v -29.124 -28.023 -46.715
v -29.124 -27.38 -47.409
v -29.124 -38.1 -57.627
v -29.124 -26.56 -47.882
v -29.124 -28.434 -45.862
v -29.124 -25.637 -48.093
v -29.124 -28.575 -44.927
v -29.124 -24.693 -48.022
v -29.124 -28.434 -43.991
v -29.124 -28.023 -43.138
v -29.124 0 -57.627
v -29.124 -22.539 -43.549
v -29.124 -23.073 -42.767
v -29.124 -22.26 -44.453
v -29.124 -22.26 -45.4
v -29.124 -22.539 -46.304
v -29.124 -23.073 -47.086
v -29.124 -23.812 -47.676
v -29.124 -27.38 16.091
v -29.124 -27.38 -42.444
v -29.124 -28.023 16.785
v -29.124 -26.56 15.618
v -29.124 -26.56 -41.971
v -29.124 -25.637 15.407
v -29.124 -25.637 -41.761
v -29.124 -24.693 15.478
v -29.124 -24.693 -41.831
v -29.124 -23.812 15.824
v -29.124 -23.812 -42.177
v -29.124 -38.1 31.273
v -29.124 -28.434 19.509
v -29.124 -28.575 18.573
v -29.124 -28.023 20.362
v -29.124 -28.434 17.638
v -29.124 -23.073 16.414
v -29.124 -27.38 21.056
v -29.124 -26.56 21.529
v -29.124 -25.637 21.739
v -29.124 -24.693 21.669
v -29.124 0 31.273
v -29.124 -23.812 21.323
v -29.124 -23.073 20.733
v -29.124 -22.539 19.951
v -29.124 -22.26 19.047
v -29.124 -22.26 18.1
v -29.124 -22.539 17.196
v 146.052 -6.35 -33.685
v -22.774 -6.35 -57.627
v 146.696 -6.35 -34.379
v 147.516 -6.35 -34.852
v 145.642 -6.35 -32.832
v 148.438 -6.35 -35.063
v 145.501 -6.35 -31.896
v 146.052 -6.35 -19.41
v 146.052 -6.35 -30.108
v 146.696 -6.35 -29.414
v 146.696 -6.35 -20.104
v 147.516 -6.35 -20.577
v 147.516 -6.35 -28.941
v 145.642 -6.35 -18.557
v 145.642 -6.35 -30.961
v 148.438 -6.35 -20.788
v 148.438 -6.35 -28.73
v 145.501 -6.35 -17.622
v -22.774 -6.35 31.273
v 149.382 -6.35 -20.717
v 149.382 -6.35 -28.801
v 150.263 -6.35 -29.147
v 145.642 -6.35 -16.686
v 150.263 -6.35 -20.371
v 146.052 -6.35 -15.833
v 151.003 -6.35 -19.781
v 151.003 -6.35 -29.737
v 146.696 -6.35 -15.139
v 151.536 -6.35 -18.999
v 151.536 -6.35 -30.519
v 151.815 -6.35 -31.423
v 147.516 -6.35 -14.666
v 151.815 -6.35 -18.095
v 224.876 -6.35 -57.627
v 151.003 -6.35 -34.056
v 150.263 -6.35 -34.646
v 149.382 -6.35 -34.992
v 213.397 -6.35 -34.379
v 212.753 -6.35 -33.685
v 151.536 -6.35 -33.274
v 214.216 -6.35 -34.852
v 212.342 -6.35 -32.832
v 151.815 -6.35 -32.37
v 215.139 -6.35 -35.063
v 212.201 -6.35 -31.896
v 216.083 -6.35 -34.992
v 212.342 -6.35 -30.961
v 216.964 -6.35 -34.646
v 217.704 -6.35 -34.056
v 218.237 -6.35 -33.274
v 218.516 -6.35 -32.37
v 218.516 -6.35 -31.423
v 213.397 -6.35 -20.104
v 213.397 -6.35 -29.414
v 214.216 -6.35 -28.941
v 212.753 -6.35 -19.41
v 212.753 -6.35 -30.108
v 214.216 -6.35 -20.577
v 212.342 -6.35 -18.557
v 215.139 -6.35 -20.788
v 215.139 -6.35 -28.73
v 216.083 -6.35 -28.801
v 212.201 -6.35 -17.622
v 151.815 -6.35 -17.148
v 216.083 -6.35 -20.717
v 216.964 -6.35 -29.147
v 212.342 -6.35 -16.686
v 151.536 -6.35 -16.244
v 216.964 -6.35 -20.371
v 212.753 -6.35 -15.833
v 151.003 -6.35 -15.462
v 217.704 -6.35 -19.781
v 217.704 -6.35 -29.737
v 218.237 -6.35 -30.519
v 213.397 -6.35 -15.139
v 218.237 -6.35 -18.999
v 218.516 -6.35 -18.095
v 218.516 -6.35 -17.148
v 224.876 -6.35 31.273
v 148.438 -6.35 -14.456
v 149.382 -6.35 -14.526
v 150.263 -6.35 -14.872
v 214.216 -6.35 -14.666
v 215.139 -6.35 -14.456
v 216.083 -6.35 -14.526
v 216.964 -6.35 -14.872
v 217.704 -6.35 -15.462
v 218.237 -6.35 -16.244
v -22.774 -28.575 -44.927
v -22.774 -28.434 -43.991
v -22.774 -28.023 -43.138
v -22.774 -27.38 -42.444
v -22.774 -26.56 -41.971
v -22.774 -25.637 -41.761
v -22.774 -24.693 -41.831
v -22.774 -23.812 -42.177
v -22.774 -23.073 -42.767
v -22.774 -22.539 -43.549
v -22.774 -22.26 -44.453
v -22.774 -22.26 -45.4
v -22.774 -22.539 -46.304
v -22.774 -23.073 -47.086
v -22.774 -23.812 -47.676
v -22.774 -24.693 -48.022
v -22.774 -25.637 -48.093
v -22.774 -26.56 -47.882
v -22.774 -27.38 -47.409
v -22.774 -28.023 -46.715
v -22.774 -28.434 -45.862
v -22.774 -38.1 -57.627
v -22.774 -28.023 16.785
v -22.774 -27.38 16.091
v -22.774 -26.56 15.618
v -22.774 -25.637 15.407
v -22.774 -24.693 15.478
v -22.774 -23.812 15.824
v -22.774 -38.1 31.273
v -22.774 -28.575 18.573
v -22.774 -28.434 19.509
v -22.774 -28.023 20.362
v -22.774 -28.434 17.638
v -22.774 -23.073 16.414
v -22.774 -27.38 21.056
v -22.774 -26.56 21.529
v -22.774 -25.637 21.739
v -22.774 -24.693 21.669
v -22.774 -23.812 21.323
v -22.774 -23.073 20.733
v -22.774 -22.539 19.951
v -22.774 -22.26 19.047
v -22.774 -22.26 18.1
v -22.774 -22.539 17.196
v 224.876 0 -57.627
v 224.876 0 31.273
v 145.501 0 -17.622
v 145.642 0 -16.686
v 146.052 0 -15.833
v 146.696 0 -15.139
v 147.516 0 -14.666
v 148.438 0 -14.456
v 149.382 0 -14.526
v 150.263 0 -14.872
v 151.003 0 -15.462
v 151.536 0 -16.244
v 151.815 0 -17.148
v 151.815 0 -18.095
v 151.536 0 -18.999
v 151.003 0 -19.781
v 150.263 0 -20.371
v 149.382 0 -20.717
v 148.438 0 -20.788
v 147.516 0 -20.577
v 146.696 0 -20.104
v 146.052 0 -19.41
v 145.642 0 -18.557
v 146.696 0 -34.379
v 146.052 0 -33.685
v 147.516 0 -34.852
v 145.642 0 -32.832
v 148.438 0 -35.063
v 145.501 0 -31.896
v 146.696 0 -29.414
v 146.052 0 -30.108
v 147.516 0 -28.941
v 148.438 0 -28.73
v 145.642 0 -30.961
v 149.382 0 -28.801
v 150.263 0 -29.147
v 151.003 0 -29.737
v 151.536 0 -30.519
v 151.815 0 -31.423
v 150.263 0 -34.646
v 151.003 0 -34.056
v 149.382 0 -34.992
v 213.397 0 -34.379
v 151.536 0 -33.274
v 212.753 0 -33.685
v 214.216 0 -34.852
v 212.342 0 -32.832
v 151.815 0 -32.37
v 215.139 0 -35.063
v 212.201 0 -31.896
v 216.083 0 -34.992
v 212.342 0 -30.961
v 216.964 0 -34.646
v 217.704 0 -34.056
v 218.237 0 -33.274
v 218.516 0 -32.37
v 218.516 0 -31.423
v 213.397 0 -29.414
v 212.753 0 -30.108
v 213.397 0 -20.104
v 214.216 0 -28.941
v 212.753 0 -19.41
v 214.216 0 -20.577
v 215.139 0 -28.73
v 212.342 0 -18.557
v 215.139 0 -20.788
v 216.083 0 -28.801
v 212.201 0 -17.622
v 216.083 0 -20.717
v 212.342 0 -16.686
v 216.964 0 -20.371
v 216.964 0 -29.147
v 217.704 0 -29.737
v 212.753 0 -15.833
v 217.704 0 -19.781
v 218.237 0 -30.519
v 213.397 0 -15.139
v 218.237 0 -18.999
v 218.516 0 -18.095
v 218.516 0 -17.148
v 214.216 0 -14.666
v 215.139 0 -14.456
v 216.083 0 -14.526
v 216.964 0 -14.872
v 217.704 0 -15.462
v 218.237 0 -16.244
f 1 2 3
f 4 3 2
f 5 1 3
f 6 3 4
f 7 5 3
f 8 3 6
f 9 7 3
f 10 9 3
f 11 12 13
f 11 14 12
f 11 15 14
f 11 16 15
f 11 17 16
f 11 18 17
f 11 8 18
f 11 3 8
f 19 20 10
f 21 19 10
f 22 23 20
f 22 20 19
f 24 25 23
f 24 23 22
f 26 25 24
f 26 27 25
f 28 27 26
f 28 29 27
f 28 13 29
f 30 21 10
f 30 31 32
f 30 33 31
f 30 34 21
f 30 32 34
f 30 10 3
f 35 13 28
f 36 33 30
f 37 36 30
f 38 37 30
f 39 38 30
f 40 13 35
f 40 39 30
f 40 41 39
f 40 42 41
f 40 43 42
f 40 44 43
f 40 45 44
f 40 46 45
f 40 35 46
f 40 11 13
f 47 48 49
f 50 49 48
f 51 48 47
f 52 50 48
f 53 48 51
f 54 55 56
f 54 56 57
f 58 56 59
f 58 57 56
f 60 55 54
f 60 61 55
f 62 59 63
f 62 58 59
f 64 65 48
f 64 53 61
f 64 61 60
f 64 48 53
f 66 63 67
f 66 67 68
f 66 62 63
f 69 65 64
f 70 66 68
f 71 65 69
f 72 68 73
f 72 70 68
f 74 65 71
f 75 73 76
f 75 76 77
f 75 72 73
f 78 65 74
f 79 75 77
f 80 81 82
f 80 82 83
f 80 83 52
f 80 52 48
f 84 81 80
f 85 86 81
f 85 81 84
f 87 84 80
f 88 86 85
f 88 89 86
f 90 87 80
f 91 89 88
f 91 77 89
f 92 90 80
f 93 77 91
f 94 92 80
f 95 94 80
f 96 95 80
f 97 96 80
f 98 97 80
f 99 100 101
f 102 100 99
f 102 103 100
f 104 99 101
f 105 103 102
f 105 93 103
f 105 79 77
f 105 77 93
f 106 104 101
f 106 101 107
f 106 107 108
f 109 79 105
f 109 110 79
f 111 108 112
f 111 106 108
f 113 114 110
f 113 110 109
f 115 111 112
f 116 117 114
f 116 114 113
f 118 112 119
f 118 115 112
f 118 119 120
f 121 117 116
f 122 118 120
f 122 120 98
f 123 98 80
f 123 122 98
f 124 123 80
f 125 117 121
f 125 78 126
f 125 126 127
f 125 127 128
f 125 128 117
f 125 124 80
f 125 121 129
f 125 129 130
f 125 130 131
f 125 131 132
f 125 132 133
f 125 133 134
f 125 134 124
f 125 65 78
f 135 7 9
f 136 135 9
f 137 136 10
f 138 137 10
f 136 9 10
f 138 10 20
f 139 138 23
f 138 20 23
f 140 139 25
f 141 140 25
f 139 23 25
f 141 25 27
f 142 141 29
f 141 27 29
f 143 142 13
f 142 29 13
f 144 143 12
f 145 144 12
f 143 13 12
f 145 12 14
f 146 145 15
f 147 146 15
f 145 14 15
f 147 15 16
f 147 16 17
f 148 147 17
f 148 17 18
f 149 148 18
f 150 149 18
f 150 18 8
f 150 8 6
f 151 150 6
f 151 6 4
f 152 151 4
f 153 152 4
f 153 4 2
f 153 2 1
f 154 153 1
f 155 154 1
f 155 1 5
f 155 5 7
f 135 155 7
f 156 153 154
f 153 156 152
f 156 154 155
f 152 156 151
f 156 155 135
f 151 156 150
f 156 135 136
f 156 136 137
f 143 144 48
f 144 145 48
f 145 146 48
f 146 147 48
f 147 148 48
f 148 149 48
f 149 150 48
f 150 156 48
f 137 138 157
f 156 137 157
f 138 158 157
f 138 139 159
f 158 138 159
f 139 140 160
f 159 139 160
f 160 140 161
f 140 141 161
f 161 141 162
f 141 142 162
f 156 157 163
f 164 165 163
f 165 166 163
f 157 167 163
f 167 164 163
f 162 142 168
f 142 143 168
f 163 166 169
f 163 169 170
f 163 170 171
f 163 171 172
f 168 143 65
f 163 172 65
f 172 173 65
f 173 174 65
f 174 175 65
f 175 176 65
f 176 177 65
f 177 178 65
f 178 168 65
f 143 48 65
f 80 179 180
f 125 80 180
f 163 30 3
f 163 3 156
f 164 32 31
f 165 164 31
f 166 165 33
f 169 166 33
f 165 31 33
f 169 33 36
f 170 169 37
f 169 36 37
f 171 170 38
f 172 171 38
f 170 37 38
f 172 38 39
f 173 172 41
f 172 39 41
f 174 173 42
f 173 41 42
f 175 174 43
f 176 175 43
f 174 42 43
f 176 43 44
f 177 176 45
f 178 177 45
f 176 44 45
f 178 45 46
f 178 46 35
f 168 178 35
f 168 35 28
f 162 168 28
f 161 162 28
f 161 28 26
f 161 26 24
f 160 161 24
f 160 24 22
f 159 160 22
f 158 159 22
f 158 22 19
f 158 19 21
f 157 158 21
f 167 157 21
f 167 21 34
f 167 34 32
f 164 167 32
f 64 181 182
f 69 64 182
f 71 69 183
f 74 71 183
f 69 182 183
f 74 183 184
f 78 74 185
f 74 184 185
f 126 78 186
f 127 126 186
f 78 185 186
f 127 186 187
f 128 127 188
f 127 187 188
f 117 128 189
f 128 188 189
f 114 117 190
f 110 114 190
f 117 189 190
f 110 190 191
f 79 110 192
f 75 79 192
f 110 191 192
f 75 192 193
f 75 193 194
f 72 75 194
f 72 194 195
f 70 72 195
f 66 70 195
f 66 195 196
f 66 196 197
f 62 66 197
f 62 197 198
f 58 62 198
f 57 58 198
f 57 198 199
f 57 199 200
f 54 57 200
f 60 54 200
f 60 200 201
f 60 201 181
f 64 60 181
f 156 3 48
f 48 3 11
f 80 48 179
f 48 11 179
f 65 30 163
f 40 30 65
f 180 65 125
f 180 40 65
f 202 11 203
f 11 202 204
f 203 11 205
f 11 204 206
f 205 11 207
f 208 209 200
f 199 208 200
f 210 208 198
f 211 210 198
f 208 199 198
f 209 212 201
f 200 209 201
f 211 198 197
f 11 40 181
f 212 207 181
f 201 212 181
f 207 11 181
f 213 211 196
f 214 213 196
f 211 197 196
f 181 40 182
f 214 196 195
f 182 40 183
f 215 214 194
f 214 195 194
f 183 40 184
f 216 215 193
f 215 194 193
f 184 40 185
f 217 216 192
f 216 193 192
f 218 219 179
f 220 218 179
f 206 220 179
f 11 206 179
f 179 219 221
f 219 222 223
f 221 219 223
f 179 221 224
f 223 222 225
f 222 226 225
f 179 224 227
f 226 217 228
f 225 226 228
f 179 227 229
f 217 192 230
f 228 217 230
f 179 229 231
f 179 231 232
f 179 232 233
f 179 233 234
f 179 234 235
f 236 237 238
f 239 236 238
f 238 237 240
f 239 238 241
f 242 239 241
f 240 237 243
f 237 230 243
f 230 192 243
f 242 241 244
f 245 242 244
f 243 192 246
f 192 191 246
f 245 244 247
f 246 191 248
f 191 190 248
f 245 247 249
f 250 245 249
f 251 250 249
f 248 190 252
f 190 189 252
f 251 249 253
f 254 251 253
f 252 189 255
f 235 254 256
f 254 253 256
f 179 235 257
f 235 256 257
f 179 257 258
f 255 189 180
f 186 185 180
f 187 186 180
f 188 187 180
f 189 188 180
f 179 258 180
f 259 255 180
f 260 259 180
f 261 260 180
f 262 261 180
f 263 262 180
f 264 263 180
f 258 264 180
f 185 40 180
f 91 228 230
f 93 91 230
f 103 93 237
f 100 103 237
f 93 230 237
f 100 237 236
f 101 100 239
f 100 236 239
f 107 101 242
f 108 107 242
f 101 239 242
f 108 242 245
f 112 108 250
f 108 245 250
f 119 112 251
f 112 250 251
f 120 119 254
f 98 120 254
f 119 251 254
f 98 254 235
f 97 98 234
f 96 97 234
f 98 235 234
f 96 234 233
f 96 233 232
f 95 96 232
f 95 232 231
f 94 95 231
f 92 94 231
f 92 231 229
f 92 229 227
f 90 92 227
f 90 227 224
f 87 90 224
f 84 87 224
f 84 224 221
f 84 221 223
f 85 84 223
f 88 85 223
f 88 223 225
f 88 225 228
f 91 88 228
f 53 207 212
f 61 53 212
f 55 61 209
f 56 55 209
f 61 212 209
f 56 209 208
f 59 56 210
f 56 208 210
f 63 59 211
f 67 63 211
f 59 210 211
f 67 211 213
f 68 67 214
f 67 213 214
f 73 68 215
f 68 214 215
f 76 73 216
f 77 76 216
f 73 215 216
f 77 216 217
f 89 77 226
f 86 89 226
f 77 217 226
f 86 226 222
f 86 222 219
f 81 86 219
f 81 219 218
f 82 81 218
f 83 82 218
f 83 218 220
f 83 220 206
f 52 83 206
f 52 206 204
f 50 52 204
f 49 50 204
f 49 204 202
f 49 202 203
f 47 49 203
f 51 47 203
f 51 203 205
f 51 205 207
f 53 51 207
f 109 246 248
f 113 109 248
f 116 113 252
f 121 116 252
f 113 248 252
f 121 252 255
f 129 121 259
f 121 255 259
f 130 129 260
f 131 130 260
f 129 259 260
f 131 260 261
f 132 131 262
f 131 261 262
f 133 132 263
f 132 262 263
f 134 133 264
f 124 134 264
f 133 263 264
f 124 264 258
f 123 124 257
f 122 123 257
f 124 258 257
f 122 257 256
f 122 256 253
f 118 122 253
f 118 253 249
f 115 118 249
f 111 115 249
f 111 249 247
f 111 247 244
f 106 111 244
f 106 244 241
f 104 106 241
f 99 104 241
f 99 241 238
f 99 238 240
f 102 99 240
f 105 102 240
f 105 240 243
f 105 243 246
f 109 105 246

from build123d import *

# Parameters (mm, degrees)
F0_W     = 254
F0_H     = 88.9
F1_DEPTH = 6.35
F3_D     = 6.35
F4_W     = 6.35
F4_H     = 88.9
F5_DEPTH = 31.75
F7_D     = 6.35


with BuildPart() as f1:
    # F0 (on Front) → F1 (new body)
    with BuildSketch(Plane.XZ):
        with Locations((97.875736, -13.176627)):
            Rectangle(F0_W, F0_H)
    extrude(amount=F1_DEPTH)

    # F3 (through all)
    with Locations(Plane.XZ.offset(6.35)):
        with Locations((148.675736, -17.621627), (215.376136, -17.621627), (215.376136, -31.896427), (148.675736, -31.896427)):
            Hole(F3_D / 2)

    # F4 (on face) → F5 (join)
    with BuildSketch(Plane.XZ.offset(6.35)):
        with Locations((-25.949264, -13.176627)):
            Rectangle(F4_W, F4_H)
    extrude(amount=F5_DEPTH)

    # F7 (through all)
    with Locations(Plane.YZ.offset(-22.774264)):
        with Locations((-25.4, -44.926627), (-25.4, 18.573373)):
            Hole(F7_D / 2)


solid = f1.part
